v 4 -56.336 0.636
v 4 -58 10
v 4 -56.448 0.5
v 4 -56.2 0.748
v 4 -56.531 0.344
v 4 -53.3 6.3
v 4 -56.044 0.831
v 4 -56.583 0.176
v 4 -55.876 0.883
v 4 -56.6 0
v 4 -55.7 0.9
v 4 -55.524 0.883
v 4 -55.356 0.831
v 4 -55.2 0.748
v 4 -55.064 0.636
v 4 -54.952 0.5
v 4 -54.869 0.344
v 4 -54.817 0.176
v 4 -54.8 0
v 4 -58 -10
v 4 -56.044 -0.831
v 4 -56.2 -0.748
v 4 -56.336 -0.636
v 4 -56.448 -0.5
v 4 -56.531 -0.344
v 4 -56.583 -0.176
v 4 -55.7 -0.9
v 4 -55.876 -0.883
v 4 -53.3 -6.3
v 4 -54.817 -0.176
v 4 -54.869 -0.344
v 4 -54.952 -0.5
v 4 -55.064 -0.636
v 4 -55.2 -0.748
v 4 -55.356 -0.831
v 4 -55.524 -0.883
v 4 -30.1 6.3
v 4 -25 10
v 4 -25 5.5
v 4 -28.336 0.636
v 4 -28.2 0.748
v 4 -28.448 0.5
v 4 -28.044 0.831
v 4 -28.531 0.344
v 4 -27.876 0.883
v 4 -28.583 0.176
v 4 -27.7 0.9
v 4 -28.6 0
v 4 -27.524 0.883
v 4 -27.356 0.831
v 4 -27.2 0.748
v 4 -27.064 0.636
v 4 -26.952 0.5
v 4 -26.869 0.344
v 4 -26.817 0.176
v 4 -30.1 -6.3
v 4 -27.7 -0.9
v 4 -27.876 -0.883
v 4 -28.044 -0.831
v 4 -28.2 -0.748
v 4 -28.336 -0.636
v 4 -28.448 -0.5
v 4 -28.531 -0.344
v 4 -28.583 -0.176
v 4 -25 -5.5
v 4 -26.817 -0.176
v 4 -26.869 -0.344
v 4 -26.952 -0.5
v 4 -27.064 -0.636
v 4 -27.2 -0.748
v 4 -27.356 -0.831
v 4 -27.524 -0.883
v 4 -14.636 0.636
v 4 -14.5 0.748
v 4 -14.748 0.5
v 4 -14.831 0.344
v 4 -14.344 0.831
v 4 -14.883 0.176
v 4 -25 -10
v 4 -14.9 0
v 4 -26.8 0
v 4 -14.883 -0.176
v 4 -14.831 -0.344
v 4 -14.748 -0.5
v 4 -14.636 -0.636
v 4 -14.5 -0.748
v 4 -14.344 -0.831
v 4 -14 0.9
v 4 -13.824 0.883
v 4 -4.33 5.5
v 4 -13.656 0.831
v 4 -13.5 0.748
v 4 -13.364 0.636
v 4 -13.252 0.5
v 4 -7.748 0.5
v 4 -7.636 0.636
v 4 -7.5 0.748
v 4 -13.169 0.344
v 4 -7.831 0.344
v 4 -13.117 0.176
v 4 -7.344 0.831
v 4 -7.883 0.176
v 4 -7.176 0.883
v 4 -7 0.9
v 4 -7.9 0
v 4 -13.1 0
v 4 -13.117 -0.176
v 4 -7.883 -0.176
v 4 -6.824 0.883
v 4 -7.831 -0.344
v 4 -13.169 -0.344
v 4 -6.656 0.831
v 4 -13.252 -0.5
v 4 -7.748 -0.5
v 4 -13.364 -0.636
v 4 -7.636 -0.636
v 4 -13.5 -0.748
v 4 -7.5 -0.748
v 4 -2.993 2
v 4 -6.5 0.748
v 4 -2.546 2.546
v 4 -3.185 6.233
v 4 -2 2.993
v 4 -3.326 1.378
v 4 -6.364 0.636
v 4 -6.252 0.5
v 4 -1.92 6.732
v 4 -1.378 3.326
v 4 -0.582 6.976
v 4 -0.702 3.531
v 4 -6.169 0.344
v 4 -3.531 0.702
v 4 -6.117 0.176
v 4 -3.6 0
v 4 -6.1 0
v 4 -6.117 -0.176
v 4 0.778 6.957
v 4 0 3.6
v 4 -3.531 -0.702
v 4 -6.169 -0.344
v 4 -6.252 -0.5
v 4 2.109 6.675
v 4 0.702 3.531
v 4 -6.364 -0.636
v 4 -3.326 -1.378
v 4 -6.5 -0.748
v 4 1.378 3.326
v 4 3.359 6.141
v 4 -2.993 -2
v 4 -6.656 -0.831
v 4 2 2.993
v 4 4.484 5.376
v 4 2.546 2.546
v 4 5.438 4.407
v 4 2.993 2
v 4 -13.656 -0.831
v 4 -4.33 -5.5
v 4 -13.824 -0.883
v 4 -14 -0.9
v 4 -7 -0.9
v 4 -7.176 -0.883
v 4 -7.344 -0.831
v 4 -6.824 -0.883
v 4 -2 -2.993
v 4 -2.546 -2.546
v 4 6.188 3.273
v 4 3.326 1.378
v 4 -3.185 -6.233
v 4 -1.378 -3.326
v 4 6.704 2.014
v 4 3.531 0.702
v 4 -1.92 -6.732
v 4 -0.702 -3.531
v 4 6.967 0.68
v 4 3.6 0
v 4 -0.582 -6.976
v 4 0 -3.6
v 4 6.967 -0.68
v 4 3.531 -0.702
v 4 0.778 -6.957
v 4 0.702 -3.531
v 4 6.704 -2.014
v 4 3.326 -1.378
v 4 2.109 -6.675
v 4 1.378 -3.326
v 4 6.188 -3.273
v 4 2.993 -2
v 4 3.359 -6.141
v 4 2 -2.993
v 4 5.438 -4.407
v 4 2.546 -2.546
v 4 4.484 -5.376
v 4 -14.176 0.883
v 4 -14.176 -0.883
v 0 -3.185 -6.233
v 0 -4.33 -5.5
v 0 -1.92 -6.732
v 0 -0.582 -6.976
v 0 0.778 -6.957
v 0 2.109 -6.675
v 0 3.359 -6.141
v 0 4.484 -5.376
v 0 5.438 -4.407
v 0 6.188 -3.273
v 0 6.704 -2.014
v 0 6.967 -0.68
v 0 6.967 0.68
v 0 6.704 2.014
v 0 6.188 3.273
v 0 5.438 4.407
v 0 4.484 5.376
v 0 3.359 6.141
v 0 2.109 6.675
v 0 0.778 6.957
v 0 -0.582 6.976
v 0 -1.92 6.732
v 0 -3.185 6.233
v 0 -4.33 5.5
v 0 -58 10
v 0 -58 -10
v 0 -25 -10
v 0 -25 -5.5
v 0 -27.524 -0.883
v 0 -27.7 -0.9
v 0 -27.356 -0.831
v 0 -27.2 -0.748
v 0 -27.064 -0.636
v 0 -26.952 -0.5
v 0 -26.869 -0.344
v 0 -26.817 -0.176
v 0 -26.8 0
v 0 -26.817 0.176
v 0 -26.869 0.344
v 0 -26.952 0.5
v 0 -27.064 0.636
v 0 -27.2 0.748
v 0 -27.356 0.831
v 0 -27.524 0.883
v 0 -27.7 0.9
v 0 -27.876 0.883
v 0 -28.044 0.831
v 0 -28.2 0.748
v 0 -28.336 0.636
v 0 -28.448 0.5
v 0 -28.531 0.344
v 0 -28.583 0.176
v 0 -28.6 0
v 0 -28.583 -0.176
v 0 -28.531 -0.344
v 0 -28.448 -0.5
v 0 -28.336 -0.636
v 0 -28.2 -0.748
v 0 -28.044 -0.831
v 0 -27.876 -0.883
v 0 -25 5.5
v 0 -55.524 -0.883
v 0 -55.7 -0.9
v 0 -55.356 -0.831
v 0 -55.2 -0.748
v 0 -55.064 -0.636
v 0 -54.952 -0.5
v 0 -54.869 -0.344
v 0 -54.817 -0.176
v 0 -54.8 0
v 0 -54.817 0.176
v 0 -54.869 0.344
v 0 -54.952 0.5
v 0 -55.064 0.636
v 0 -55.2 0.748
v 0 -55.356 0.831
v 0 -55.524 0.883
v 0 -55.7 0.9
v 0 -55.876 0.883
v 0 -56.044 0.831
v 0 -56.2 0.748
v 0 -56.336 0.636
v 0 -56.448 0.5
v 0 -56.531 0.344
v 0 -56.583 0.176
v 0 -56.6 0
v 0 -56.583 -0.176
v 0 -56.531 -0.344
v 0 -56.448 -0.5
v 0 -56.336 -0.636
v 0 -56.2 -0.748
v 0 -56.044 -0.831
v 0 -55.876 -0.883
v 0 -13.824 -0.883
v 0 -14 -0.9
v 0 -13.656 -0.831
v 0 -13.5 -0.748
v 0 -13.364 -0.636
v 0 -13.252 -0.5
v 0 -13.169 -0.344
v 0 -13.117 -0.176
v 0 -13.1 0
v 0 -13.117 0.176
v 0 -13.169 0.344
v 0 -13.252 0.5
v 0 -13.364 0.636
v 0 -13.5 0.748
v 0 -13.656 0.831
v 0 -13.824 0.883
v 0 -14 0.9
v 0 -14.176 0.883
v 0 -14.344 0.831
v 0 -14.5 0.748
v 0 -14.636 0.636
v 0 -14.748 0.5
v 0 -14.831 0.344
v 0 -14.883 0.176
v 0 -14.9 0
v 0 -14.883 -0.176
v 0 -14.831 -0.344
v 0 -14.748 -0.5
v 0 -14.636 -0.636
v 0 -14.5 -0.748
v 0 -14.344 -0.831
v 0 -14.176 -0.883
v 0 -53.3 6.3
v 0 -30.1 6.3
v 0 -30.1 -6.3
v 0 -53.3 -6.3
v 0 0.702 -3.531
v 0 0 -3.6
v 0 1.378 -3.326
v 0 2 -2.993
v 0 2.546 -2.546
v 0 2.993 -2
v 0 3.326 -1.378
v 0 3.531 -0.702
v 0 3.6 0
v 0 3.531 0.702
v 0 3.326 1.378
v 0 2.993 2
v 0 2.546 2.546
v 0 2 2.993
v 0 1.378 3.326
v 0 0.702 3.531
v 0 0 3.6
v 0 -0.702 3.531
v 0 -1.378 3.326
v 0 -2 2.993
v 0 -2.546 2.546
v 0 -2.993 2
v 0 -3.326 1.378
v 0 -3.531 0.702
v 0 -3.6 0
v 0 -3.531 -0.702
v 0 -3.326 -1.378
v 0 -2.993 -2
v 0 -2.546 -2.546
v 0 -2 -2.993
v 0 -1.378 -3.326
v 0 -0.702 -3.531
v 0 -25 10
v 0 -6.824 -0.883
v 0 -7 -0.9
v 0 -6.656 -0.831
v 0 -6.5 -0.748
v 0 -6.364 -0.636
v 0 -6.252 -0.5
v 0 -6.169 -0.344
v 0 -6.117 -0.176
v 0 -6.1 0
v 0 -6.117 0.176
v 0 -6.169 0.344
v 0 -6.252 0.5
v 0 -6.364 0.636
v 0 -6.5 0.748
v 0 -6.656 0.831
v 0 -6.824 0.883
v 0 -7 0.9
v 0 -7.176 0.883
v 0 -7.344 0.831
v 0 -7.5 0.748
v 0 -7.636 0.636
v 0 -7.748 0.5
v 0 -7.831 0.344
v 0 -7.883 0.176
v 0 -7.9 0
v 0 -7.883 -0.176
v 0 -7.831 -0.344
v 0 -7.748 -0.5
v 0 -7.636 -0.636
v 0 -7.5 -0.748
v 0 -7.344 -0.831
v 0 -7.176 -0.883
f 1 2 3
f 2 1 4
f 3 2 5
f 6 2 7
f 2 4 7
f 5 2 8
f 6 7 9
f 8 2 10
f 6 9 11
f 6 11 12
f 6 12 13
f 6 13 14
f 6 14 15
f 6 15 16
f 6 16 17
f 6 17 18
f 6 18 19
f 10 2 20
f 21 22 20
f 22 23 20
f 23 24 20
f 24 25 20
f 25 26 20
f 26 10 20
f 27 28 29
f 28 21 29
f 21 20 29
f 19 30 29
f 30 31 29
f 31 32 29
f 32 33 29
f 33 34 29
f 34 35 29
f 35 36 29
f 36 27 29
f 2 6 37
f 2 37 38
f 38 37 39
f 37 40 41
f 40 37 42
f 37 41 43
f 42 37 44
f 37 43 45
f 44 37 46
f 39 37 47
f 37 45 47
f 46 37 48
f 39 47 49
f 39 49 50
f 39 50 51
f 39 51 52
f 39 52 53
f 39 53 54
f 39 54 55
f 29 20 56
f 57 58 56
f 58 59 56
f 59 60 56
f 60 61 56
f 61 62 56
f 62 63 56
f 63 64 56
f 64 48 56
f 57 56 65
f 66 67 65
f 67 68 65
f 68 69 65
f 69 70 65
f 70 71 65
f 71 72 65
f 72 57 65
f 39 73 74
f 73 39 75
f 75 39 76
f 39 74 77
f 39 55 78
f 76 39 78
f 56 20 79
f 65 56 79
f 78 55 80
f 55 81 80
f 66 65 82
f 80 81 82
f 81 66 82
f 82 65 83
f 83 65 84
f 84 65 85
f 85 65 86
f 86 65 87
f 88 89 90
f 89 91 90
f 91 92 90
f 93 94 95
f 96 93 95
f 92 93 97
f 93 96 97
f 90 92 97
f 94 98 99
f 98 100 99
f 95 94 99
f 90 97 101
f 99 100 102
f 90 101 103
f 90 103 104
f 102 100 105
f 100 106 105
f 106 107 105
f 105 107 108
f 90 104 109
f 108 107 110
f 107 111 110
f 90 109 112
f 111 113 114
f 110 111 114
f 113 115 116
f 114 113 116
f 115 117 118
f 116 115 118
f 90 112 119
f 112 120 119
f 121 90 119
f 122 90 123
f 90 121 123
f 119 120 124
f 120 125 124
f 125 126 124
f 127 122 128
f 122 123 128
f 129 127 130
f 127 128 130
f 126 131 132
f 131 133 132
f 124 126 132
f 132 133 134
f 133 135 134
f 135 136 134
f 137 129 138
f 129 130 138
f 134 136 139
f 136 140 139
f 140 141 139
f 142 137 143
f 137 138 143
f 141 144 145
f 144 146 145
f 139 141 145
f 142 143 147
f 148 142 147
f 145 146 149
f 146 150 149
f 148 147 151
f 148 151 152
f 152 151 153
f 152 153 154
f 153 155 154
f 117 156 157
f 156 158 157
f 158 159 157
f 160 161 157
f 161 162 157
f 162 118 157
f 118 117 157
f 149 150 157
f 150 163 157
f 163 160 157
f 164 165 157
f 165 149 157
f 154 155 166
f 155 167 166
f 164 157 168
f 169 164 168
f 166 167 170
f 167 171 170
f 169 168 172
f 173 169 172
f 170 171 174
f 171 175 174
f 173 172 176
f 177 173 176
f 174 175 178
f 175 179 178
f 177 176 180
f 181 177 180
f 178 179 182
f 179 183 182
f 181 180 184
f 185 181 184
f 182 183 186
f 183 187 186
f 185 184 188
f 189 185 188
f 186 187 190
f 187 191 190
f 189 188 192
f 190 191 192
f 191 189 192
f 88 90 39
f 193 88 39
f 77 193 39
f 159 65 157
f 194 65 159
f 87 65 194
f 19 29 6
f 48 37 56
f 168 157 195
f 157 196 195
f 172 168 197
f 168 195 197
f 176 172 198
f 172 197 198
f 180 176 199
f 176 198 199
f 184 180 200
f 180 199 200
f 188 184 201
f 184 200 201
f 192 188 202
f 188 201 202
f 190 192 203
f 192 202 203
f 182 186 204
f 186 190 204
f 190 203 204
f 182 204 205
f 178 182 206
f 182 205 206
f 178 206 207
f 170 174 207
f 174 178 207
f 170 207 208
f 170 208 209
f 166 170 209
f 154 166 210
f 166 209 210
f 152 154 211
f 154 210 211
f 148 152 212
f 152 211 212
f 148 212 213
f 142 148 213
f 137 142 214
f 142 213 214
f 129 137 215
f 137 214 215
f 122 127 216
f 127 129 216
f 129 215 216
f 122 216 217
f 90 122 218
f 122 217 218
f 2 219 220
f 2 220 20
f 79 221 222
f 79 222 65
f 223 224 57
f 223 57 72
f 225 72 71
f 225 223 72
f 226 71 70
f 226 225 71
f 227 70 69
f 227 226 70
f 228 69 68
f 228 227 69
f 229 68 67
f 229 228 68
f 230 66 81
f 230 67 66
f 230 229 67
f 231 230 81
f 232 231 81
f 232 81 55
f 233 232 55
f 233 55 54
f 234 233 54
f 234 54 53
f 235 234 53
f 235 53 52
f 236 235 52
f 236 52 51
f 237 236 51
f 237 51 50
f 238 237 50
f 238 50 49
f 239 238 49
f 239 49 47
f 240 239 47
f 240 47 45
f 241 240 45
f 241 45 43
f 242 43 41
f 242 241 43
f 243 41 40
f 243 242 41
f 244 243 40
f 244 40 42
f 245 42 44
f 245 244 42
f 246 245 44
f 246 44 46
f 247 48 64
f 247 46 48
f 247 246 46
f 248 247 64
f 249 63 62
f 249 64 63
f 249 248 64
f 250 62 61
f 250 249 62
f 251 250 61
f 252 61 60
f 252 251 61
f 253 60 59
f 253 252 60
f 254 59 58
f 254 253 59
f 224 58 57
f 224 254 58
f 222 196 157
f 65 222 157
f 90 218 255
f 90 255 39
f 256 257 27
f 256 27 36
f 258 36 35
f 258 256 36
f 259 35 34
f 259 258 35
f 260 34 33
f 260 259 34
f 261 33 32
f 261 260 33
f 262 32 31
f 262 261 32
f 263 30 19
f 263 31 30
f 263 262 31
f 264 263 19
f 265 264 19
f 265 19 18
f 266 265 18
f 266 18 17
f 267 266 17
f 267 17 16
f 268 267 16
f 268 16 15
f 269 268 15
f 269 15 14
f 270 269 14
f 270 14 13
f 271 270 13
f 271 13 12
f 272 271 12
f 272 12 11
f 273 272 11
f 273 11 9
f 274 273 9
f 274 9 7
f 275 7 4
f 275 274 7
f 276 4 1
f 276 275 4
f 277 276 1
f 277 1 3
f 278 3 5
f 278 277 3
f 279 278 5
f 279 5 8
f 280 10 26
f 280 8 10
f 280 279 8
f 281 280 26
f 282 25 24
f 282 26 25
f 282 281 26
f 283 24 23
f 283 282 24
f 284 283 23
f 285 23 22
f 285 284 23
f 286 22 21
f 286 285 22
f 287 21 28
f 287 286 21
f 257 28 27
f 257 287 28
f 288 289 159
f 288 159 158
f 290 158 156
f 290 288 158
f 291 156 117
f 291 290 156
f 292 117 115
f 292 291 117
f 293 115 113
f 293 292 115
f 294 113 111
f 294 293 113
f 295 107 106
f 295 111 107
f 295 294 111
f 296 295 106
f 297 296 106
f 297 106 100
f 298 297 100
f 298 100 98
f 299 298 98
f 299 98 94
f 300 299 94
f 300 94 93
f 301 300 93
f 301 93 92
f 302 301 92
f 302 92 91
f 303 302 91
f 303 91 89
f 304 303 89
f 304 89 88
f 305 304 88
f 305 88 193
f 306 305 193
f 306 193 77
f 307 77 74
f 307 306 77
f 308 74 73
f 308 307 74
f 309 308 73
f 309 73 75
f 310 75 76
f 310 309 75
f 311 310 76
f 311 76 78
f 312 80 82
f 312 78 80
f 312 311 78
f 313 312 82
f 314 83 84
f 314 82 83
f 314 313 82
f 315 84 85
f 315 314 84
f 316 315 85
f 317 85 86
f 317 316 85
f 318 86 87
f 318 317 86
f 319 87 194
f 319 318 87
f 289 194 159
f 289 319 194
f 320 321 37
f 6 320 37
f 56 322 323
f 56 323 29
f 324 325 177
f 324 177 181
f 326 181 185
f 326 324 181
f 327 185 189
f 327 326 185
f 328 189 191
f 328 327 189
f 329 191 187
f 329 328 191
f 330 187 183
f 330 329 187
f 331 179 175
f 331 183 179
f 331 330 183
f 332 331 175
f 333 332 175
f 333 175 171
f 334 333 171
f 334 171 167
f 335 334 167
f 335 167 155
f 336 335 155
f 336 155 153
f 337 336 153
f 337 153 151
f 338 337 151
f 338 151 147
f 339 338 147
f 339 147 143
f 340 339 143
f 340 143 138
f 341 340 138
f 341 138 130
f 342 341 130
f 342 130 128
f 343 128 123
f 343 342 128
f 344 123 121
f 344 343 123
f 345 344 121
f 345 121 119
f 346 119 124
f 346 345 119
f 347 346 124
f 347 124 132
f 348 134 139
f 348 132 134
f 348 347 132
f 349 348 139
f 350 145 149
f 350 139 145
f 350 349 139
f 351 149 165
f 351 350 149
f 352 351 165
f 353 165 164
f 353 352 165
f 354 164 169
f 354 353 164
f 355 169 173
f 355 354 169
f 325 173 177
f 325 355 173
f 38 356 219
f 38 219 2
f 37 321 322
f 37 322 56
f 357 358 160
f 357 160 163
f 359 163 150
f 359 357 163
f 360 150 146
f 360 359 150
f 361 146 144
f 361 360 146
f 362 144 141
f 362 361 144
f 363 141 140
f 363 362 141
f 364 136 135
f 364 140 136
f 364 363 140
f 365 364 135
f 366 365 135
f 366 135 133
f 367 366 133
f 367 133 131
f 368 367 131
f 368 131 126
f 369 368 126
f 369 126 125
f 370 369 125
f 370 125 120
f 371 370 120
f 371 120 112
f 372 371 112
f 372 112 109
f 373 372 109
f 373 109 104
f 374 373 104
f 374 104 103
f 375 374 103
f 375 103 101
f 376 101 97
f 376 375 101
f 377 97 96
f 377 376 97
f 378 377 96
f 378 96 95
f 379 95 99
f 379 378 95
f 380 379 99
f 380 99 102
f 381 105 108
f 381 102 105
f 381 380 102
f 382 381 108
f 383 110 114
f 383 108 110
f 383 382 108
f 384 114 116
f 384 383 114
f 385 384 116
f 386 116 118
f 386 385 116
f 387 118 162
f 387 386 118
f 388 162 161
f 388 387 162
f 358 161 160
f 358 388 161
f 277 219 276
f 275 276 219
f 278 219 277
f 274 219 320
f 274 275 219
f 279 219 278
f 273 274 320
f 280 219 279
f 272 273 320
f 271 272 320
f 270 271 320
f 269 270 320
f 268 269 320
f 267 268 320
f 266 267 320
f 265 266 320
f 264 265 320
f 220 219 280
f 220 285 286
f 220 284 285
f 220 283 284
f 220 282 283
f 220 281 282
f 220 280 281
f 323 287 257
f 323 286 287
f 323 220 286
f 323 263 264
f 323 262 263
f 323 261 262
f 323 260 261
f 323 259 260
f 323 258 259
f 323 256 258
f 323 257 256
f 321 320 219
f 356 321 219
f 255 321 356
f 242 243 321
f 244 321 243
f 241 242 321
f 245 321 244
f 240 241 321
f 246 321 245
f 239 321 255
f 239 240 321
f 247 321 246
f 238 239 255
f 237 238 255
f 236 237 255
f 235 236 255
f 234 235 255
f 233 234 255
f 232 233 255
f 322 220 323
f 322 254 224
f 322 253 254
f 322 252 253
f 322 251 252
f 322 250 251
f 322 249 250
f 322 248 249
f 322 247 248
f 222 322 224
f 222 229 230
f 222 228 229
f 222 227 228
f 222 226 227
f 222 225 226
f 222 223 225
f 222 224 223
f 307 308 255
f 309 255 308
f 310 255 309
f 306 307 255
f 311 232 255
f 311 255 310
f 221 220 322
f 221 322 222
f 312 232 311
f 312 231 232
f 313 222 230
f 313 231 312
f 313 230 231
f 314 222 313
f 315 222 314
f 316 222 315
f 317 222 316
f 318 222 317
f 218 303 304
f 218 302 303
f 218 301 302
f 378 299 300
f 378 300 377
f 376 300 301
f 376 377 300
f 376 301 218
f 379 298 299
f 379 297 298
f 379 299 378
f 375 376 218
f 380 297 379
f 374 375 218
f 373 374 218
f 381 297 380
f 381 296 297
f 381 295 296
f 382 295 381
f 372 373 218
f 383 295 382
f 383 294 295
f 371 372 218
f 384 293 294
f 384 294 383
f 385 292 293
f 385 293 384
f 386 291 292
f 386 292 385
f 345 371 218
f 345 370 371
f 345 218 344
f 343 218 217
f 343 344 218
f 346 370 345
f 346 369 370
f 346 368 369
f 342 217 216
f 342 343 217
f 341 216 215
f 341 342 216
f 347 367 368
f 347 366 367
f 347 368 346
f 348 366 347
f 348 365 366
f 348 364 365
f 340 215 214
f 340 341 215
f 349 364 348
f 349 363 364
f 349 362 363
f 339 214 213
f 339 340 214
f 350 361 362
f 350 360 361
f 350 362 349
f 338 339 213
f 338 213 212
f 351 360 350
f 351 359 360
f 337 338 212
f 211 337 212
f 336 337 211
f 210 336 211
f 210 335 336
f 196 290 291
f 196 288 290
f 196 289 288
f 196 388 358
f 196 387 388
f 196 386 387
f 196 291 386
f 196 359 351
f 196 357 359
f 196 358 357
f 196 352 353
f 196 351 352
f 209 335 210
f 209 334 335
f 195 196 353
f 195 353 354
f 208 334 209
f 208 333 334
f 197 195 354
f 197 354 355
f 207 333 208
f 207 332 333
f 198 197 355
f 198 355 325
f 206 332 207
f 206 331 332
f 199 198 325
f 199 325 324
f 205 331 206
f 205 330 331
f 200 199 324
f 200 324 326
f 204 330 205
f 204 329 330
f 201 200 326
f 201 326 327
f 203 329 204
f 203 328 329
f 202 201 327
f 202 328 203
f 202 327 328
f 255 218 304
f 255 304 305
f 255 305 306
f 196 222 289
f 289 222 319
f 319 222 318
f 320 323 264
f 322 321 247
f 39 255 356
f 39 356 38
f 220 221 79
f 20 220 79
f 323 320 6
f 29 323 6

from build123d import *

# Parameters (mm, degrees)
SKETCH1_R           = 7
BOSS_EXTRUDE1_DEPTH = 4
BOSS_EXTRUDE2_START = -5.5
SKETCH2_W           = 4
SKETCH2_H           = 36
BOSS_EXTRUDE2_DEPTH = 11
BOSS_EXTRUDE3_START = -10
SKETCH3_W           = 4
SKETCH3_H           = 33
BOSS_EXTRUDE3_DEPTH = 20
BOSS_EXTRUDE4_START = -1
SKETCH4_R           = 3.6
BOSS_EXTRUDE4_DEPTH = 6
BOSS_EXTRUDE5_START = -1
SKETCH5_R           = 0.9
BOSS_EXTRUDE5_DEPTH = 6
BOSS_EXTRUDE6_START = -1
SKETCH6_R           = 0.9
BOSS_EXTRUDE6_DEPTH = 6
BOSS_EXTRUDE7_START = -6.3
SKETCH7_W           = 6
SKETCH7_H           = 23.2
BOSS_EXTRUDE7_DEPTH = 12.6
BOSS_EXTRUDE8_START = -1
SKETCH8_R           = 0.9
BOSS_EXTRUDE8_DEPTH = 6
BOSS_EXTRUDE9_START = -1
SKETCH9_R           = 0.9
BOSS_EXTRUDE9_DEPTH = 6


with BuildPart() as part:
    # Sketch1 → Boss-Extrude1 (new body)
    with BuildSketch(Plane(origin=(0, 0, 0), x_dir=(0, 0, -1), z_dir=(1, 0, 0))):
        Circle(SKETCH1_R)
    extrude(amount=BOSS_EXTRUDE1_DEPTH)

    # Sketch2 → Boss-Extrude2 (add)
    with BuildSketch(Plane.XY.offset(BOSS_EXTRUDE2_START)):
        with Locations((2, -18)):
            Rectangle(SKETCH2_W, SKETCH2_H)
    extrude(amount=BOSS_EXTRUDE2_DEPTH)

    # Sketch3 → Boss-Extrude3 (add)
    with BuildSketch(Plane.XY.offset(BOSS_EXTRUDE3_START)):
        with Locations((2, -41.5)):
            Rectangle(SKETCH3_W, SKETCH3_H)
    extrude(amount=BOSS_EXTRUDE3_DEPTH)


with BuildPart() as body_2:
    # Sketch4 → Boss-Extrude4 (new body)
    with BuildSketch(Plane(origin=(0, 0, 0), x_dir=(0, 0, -1), z_dir=(1, 0, 0)).offset(BOSS_EXTRUDE4_START)):
        Circle(SKETCH4_R)
    extrude(amount=BOSS_EXTRUDE4_DEPTH)


with BuildPart() as part_1:
    add(part.part)

    # Combine1: cut body 2
    add(body_2.part, mode=Mode.SUBTRACT)


with BuildPart() as body_2_2:
    # Sketch5 → Boss-Extrude5 (new body)
    with BuildSketch(Plane(origin=(0, 0, 0), x_dir=(0, 0, -1), z_dir=(1, 0, 0)).offset(BOSS_EXTRUDE5_START)):
        with Locations((0, -7)):
            Circle(SKETCH5_R)
    extrude(amount=BOSS_EXTRUDE5_DEPTH)


with BuildPart() as part_2:
    add(part_1.part)

    # Combine2: cut body 2 2
    add(body_2_2.part, mode=Mode.SUBTRACT)


with BuildPart() as body_2_3:
    # Sketch6 → Boss-Extrude6 (new body)
    with BuildSketch(Plane(origin=(0, 0, 0), x_dir=(0, 0, -1), z_dir=(1, 0, 0)).offset(BOSS_EXTRUDE6_START)):
        with Locations((0, -14)):
            Circle(SKETCH6_R)
    extrude(amount=BOSS_EXTRUDE6_DEPTH)


with BuildPart() as part_3:
    add(part_2.part)

    # Combine3: cut body 2 3
    add(body_2_3.part, mode=Mode.SUBTRACT)


with BuildPart() as body_2_4:
    # Sketch7 → Boss-Extrude7 (new body)
    with BuildSketch(Plane.XY.offset(BOSS_EXTRUDE7_START)):
        with Locations((2, -41.7)):
            Rectangle(SKETCH7_W, SKETCH7_H)
    extrude(amount=BOSS_EXTRUDE7_DEPTH)


with BuildPart() as part_4:
    add(part_3.part)

    # Combine4: cut body 2 4
    add(body_2_4.part, mode=Mode.SUBTRACT)


with BuildPart() as body_2_5:
    # Sketch8 → Boss-Extrude8 (new body)
    with BuildSketch(Plane(origin=(0, 0, 0), x_dir=(0, 0, -1), z_dir=(1, 0, 0)).offset(BOSS_EXTRUDE8_START)):
        with Locations((0, -27.7)):
            Circle(SKETCH8_R)
    extrude(amount=BOSS_EXTRUDE8_DEPTH)


with BuildPart() as part_5:
    add(part_4.part)

    # Combine5: cut body 2 5
    add(body_2_5.part, mode=Mode.SUBTRACT)


with BuildPart() as body_2_6:
    # Sketch9 → Boss-Extrude9 (new body)
    with BuildSketch(Plane(origin=(0, 0, 0), x_dir=(0, 0, -1), z_dir=(1, 0, 0)).offset(BOSS_EXTRUDE9_START)):
        with Locations((0, -55.7)):
            Circle(SKETCH9_R)
    extrude(amount=BOSS_EXTRUDE9_DEPTH)


with BuildPart() as part_6:
    add(part_5.part)

    # Combine6: cut body 2 6
    add(body_2_6.part, mode=Mode.SUBTRACT)


solid = part_6.part
